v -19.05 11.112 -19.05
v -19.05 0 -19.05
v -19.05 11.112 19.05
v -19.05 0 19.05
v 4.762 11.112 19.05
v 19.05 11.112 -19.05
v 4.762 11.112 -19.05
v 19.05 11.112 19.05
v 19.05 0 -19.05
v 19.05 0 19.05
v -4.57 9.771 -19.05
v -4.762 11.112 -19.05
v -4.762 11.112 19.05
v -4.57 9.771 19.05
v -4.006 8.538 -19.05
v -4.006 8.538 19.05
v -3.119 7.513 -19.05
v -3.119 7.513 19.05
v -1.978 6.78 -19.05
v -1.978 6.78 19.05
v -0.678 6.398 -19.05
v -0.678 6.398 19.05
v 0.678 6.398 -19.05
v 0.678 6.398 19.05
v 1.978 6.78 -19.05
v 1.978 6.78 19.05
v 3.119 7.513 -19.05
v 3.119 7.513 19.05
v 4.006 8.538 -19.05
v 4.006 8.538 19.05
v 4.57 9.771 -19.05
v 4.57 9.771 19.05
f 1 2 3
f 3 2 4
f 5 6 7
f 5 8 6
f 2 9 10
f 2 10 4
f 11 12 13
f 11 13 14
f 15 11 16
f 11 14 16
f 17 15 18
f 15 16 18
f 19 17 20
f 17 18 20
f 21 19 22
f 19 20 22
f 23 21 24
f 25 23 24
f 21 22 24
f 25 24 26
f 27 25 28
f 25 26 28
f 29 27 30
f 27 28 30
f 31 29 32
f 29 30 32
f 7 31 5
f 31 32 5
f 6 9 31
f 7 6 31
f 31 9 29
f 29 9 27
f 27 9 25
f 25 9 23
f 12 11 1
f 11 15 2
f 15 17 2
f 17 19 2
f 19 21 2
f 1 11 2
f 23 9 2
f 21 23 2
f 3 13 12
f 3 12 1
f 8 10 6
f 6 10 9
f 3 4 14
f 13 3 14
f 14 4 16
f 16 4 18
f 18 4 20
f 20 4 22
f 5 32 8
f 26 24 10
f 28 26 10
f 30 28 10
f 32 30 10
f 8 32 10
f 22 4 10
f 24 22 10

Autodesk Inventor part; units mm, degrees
ref_plane "YZ Plane" through (0, 0, 0) normal (1, 0, 0) x (0, 1, 0)
ref_plane "XZ Plane" through (0, 0, 0) normal (0, 1, 0) x (-1, 0, 0)
ref_plane "XY Plane" through (0, 0, 0) normal (0, 0, 1) x (1, 0, 0)
sketch "Sketch1" plane through (0, 0, 0) normal (0, 1, 0) x (-1, 0, 0)
  line L0 (-19.05, 19.05) -> (-19.05, -19.05)
  line L1 (-19.05, -19.05) -> (19.05, -19.05)
  line L2 (19.05, -19.05) -> (19.05, 19.05)
  line L3 (19.05, 19.05) -> (-19.05, 19.05)
  line L4 (-19.05, 19.05) -> (19.05, -19.05) construction
  line L5 (-19.05, -19.05) -> (19.05, 19.05) construction
  point P0 (0, 0)
  dimension "d0" = 38.1
extrude "Extrusion1" add sketch "Sketch1" along normal blind 11.1125
sketch "Sketch2" plane through (-19.05, 0, 19.05) normal (0, 0, 1) x (1, 0, 0)
  line L0 (38.1, 11.1125) -> (0, 11.1125) projected
  arc A0 (14.2875, 11.1125) -> (23.8125, 11.1125) centre (19.05, 11.1125) ccw
  point P0 (19.05, 0)
  dimension "d3" = 9.525
extrude "Extrusion2" cut sketch "Sketch2" against normal through all
equation "\"d0\" = width"
equation "\"d1\" = heightOfBottomHole"
equation "\"d3\" = bottomHoleDiam"
equation "\"d4\" = deltaBottomToTop"
equation "\"bottomHoleDiam\" = 9.525"
equation "\"width\" = 38.1"
equation "\"height\" = deltaBottomToTop + heightOfBottomHole + heightOfTopHole"
equation "\"deltaBottomToTop\" = 25.4"
equation "\"heightOfBottomHole\" = 11.1125"
equation "\"heightOfTopHole\" = 11.1125"
properties part number "BottomOfSquareSupport"
